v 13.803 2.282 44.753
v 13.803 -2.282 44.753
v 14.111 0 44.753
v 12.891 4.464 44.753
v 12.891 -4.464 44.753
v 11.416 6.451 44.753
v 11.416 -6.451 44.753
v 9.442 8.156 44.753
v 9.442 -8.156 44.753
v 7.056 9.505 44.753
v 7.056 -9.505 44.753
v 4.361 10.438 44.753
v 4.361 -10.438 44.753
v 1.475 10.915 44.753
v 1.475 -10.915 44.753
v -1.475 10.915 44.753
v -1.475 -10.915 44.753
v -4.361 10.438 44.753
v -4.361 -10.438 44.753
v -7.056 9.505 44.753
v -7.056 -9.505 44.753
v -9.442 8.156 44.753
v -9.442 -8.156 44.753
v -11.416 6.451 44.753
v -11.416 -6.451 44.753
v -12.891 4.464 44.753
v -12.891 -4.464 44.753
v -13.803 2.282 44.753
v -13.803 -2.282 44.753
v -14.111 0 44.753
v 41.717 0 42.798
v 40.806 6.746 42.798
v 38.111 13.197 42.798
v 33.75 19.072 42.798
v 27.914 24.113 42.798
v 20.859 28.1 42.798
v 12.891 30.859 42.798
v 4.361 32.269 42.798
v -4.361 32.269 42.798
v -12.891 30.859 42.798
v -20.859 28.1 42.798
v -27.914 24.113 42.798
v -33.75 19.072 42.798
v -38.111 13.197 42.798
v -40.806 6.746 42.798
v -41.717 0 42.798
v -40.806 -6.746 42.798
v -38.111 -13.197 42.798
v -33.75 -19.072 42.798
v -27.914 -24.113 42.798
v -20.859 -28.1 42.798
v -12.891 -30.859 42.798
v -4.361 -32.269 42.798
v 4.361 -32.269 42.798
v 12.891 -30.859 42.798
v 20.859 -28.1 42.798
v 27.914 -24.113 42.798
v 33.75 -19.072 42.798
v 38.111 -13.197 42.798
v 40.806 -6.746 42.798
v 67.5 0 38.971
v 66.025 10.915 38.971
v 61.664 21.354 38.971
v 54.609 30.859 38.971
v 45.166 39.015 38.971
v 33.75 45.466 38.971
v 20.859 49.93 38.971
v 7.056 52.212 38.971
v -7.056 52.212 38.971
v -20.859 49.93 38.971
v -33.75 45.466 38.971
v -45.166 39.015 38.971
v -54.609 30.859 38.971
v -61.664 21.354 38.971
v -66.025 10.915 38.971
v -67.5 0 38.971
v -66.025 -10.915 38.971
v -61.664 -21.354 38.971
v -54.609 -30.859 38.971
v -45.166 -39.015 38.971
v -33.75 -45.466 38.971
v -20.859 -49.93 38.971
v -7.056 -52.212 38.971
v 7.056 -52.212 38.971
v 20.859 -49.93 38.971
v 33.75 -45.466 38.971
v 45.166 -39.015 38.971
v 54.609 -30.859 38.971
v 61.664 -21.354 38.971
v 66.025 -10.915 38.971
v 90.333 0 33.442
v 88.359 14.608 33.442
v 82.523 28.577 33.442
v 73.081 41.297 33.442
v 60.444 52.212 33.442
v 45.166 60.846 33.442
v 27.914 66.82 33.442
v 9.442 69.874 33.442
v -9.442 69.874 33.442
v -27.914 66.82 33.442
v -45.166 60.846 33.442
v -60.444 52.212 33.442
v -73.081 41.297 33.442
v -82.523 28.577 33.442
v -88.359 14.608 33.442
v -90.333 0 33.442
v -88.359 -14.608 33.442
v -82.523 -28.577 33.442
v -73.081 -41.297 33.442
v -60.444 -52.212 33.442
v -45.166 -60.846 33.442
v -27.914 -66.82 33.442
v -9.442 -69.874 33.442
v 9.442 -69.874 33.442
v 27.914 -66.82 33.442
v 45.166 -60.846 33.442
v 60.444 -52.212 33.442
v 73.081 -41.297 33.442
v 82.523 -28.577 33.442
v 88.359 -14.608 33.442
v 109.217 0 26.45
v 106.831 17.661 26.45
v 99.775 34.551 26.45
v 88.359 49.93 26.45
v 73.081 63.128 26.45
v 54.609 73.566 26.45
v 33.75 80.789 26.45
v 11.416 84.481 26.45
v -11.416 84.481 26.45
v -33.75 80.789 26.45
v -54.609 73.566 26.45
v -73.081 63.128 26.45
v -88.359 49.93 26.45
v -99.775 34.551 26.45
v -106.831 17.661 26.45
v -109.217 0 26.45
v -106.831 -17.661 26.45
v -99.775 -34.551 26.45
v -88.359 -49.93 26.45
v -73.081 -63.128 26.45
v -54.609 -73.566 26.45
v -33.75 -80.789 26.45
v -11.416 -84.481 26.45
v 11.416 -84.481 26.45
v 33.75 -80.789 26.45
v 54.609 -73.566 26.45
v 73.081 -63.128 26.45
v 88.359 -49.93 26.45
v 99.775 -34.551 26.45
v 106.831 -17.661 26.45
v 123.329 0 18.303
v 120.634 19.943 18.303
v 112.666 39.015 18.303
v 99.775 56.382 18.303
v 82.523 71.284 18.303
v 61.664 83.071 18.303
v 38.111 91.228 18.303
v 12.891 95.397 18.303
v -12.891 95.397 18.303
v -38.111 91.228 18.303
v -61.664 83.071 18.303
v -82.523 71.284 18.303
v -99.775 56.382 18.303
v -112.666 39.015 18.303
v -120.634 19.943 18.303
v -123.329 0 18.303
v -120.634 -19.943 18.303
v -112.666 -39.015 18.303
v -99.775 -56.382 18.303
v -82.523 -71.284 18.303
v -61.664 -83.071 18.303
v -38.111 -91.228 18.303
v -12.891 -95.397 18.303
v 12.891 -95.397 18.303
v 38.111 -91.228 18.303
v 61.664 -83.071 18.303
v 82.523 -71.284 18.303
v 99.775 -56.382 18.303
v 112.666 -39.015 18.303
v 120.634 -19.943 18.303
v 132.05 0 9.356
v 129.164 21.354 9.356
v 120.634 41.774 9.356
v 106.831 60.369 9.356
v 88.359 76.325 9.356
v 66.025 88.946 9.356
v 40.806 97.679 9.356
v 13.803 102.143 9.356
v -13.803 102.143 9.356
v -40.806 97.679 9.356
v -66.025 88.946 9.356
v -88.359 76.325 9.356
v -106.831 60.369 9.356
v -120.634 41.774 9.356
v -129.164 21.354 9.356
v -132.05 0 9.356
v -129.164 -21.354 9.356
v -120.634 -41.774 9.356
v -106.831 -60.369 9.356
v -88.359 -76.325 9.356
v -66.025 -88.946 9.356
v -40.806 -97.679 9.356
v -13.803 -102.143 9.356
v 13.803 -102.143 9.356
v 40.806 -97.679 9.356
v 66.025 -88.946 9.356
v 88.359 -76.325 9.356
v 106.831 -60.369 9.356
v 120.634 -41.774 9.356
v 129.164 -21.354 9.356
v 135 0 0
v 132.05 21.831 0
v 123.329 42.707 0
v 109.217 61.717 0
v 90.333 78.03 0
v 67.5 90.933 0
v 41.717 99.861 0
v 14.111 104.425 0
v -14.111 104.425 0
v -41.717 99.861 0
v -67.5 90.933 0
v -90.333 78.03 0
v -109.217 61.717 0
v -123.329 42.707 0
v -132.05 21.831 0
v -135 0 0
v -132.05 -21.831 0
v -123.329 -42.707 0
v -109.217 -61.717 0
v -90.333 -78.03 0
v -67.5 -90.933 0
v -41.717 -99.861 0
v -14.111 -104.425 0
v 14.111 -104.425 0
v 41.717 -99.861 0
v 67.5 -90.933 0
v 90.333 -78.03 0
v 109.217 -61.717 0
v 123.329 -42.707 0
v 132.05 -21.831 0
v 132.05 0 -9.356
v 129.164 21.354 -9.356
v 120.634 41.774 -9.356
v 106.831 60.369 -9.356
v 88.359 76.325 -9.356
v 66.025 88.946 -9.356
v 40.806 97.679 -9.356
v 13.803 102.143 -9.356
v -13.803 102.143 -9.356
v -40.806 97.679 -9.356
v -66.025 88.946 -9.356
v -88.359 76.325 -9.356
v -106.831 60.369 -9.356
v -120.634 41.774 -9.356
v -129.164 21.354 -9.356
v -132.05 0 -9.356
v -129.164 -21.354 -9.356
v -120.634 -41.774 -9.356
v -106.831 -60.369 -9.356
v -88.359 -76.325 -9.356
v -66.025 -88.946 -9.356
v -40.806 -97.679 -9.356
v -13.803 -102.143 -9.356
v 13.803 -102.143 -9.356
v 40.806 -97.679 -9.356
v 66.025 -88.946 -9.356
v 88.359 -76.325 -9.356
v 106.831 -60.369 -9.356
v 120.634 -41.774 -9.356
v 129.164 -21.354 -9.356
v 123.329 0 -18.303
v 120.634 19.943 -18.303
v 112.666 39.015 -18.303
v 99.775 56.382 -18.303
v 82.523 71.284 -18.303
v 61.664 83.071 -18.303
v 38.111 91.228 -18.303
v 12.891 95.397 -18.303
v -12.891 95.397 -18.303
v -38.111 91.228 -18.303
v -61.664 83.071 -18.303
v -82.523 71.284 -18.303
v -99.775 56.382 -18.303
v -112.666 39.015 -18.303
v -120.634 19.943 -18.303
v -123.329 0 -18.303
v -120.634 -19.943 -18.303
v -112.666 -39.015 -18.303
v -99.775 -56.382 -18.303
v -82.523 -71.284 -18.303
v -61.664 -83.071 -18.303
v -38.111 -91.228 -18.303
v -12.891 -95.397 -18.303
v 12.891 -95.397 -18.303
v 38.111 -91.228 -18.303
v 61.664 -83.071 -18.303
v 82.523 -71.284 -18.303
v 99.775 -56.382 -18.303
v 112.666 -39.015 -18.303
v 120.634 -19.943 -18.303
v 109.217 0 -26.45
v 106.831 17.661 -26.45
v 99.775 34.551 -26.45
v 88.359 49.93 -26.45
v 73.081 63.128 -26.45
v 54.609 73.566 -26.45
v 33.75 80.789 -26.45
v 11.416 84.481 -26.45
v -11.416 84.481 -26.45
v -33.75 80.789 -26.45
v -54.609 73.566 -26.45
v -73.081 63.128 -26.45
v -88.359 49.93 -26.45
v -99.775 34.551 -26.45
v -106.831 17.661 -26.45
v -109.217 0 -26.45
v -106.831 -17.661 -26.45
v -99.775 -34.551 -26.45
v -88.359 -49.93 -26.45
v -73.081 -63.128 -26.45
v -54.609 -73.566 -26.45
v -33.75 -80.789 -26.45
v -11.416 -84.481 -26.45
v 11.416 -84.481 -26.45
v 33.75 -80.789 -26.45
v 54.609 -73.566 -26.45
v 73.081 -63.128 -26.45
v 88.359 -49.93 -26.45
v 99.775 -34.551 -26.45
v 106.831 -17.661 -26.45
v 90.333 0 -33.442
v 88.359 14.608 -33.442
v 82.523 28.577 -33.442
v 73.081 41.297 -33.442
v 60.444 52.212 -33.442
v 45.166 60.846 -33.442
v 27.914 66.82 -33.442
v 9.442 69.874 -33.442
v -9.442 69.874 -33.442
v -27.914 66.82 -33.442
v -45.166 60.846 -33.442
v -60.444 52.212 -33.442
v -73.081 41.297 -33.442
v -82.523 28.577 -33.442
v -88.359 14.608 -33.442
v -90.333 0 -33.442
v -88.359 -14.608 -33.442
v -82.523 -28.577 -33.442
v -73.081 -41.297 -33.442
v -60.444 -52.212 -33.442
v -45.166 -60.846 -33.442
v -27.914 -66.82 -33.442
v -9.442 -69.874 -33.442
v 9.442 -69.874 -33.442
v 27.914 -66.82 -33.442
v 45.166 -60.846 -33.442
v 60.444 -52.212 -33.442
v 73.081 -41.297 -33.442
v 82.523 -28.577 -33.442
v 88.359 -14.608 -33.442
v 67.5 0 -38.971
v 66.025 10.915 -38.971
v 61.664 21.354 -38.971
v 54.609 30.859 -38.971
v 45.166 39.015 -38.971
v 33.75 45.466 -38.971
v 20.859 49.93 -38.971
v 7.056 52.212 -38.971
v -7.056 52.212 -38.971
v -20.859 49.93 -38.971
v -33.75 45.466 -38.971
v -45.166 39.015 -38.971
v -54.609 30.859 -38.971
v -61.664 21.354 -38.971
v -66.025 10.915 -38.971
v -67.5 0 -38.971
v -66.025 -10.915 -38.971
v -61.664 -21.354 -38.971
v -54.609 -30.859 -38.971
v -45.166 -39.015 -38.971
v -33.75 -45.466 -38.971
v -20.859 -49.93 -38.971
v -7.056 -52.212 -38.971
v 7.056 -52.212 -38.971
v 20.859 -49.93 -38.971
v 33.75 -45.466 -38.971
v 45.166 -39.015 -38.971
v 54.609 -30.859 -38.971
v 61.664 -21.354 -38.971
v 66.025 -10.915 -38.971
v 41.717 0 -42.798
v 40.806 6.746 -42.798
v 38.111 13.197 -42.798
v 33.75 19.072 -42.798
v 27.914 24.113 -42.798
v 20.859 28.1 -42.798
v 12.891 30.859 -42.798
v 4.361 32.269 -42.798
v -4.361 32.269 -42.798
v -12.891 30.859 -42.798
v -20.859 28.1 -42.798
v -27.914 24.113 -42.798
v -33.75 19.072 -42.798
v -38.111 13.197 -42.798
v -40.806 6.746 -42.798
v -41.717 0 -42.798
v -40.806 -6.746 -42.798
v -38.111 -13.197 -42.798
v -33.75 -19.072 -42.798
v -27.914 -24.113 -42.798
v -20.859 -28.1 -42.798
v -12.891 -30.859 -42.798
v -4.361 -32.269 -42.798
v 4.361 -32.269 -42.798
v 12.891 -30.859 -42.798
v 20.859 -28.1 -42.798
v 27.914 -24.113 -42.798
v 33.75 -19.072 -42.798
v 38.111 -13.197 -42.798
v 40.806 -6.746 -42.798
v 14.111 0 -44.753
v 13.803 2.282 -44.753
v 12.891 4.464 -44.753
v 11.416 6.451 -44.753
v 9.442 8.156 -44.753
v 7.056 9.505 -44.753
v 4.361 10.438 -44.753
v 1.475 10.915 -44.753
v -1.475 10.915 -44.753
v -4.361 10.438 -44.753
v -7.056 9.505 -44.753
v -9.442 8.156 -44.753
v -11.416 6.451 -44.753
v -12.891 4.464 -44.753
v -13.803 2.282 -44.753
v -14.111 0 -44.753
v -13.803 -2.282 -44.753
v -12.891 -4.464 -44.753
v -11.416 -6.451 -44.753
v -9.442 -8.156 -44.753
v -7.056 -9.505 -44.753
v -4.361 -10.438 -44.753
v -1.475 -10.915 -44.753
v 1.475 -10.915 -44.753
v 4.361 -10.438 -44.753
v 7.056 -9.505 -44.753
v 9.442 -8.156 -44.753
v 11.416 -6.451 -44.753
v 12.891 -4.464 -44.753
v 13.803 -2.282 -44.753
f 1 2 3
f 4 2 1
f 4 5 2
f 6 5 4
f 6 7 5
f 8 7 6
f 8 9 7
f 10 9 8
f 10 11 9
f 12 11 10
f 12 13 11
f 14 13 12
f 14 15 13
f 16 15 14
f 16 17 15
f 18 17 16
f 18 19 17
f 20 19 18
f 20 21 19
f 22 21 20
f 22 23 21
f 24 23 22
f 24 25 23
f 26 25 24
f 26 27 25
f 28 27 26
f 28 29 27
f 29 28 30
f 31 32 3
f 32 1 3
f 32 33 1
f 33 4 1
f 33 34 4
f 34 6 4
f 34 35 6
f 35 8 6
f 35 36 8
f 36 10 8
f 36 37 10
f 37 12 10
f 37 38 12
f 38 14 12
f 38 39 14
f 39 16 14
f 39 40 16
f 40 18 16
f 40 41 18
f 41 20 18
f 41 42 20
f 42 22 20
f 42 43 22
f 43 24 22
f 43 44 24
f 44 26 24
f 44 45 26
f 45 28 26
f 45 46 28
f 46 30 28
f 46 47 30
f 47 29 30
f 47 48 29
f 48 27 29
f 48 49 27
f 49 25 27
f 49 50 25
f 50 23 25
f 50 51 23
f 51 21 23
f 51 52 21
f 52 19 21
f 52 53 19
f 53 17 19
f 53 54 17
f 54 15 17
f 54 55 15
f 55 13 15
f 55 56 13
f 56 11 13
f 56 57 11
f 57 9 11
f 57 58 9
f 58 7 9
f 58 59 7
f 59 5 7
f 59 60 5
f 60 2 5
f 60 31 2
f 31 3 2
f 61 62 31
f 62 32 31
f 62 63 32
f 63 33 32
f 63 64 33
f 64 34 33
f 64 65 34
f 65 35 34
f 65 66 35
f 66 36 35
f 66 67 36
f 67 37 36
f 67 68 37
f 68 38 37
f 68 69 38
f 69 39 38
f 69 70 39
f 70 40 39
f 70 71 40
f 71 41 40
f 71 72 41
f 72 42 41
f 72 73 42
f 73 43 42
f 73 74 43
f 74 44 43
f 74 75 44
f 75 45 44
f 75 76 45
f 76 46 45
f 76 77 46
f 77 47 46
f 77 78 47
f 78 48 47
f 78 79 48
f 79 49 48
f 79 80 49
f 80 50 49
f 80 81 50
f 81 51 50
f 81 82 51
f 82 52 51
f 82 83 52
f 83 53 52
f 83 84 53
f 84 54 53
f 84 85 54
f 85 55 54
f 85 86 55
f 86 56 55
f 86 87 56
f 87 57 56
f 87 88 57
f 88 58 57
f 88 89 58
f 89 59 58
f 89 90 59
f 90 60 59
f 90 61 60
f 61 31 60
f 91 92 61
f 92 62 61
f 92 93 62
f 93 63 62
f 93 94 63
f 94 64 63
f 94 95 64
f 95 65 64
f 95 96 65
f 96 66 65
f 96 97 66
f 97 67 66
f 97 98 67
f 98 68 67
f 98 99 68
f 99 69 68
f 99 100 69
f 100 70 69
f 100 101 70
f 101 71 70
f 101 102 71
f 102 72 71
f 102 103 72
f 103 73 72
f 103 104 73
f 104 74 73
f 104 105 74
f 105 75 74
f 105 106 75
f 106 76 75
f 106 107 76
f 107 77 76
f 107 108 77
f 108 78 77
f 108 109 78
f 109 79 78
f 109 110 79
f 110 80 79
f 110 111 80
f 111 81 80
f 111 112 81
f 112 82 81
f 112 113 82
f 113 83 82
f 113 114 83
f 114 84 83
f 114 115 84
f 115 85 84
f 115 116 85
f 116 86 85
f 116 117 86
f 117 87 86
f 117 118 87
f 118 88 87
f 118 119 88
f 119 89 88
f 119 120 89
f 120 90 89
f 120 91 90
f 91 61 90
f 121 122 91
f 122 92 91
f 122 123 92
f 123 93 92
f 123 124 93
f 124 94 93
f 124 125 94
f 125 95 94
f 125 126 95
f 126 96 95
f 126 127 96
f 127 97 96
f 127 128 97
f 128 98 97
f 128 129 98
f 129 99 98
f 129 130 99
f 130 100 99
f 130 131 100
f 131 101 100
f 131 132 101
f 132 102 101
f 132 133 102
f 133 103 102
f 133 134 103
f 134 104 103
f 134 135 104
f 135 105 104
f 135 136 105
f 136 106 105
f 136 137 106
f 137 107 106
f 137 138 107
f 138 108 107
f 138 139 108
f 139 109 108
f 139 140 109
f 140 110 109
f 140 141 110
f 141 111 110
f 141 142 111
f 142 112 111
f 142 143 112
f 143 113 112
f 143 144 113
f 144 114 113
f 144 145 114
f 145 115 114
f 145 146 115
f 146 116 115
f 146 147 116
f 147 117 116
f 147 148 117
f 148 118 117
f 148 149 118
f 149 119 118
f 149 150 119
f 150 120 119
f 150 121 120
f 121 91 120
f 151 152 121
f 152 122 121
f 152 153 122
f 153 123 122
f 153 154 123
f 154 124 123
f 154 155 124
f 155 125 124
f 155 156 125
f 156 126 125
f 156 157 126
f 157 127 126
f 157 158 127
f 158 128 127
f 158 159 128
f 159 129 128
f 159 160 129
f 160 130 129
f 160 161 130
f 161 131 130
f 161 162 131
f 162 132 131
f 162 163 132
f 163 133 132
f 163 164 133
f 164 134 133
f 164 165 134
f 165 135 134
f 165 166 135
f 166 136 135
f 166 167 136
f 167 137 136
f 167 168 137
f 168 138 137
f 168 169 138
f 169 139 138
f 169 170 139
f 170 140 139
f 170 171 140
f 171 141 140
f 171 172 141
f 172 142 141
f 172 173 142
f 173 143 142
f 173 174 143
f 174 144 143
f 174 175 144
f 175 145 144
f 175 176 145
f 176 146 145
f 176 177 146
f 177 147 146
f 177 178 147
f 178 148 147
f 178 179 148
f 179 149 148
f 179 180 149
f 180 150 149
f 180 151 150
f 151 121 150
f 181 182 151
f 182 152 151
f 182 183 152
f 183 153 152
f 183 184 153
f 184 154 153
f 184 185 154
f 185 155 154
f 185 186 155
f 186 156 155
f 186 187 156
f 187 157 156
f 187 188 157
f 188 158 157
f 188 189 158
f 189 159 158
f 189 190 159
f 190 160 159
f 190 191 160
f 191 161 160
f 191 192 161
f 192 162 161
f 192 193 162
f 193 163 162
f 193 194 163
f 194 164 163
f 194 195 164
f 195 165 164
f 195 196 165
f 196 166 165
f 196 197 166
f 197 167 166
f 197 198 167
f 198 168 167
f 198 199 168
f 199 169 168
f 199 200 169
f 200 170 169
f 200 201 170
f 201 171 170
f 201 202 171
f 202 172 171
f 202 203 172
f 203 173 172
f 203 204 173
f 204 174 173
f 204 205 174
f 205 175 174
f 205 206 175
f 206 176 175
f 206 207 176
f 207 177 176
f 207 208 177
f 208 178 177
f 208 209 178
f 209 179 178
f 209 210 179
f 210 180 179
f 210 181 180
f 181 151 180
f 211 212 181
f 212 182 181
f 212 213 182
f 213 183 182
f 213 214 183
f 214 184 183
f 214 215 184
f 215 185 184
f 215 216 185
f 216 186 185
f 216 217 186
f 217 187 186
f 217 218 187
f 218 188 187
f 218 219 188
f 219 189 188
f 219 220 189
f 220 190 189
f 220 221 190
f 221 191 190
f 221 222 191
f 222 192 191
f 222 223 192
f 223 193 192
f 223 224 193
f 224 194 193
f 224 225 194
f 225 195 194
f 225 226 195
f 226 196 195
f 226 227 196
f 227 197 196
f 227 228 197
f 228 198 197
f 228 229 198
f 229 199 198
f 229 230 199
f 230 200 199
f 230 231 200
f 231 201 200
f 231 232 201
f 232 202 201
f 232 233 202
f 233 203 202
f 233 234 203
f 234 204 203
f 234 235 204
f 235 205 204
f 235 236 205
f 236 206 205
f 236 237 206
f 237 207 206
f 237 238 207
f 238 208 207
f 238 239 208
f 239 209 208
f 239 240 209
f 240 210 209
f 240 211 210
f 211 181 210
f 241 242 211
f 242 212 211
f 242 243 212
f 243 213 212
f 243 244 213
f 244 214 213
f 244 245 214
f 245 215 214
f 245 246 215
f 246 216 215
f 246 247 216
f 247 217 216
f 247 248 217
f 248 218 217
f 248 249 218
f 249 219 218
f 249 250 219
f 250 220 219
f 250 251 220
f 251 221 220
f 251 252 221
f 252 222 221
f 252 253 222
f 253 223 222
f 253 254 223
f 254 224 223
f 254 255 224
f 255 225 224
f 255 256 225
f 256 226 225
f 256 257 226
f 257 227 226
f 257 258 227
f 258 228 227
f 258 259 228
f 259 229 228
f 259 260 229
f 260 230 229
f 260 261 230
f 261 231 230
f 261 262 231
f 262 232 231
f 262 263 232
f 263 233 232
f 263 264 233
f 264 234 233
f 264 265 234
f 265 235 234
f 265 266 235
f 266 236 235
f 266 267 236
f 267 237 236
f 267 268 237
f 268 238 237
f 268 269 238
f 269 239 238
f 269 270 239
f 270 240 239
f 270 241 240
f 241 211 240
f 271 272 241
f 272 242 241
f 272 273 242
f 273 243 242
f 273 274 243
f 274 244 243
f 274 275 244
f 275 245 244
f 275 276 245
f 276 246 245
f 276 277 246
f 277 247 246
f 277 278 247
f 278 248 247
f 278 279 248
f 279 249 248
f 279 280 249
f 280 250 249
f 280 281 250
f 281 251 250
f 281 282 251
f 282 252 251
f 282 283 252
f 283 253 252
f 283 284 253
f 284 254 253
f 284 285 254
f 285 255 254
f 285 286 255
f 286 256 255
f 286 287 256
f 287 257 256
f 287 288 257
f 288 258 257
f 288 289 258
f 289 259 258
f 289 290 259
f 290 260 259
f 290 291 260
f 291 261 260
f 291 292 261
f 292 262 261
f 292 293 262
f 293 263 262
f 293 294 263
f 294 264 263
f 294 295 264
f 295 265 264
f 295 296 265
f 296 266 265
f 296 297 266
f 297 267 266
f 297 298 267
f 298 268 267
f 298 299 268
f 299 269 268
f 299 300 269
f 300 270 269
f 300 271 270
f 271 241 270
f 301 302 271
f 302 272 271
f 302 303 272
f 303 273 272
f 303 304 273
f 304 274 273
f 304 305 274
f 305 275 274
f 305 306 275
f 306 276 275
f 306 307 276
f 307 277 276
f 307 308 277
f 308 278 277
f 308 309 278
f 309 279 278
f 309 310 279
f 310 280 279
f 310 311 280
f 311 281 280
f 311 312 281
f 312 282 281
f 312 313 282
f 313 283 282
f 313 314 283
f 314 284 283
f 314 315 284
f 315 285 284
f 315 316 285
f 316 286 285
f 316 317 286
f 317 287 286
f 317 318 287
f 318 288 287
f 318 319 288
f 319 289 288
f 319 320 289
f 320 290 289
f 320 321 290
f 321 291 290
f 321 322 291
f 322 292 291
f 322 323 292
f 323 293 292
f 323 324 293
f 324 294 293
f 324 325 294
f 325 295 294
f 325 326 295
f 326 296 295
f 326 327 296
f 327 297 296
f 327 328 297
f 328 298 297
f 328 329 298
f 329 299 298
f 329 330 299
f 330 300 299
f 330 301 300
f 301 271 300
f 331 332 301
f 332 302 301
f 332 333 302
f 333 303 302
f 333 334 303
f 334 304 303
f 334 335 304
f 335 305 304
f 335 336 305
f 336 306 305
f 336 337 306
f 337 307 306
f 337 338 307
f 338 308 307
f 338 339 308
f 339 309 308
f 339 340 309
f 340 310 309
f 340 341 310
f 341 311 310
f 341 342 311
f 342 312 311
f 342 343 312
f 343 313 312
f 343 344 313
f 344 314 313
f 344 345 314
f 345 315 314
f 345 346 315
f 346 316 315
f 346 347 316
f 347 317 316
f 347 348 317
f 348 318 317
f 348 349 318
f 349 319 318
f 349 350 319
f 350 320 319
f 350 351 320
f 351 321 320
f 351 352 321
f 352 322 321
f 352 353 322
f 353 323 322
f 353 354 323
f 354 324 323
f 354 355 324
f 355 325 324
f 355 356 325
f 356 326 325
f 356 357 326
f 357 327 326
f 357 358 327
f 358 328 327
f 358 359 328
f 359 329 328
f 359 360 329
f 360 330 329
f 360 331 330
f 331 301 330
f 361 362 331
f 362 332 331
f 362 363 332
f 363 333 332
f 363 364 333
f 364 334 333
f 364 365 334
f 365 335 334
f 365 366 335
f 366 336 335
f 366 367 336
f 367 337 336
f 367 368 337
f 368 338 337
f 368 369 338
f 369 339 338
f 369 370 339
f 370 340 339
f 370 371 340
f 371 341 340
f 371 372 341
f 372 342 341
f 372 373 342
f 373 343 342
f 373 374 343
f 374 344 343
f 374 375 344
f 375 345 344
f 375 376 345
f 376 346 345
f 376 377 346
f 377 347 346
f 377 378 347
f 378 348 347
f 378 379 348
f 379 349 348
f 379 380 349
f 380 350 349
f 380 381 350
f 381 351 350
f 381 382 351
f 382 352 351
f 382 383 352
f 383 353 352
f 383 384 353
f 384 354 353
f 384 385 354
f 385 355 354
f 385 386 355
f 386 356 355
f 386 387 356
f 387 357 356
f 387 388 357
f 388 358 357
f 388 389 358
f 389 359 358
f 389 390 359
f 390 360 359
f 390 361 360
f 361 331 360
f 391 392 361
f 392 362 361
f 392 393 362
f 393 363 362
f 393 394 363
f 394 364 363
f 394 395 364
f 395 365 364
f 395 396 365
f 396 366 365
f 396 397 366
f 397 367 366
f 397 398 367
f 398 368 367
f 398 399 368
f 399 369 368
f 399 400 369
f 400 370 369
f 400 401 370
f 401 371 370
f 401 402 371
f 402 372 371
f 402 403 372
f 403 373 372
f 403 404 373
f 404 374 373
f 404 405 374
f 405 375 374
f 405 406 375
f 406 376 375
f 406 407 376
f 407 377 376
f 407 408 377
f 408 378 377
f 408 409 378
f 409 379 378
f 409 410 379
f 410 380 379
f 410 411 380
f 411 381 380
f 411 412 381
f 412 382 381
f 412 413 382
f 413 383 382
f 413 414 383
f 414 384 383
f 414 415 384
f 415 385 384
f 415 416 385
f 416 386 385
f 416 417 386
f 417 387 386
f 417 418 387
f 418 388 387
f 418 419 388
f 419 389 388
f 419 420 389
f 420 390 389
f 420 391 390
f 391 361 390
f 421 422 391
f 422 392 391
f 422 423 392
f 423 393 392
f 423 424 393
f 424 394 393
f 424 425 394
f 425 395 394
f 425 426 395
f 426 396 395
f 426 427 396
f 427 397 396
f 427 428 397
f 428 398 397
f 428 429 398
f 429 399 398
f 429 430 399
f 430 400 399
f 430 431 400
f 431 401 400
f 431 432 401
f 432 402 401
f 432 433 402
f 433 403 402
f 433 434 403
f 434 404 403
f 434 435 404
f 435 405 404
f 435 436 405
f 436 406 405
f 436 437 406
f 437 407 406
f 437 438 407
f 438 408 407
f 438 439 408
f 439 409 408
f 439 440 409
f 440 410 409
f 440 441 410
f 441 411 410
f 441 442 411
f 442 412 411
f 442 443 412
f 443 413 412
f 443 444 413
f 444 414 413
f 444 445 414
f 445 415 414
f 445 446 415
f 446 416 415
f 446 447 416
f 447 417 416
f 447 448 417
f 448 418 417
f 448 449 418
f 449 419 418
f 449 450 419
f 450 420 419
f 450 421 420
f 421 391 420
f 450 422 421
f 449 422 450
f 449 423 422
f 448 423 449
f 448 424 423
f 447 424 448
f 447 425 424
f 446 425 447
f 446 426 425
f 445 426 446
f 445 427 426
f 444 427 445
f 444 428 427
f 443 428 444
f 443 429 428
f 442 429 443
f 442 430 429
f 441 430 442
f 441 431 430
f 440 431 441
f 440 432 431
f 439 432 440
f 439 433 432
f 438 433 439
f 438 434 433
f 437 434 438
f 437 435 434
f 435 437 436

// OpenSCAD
// Generated by SolidPython 1.0.1 on 2020-07-29 00:46:48


scale(v = [9, 7, 3]) {
	sphere(r = 15);
}
/***********************************************
*********      SolidPython code:      **********
************************************************
 
# import packages: SolidPython
from solid import *
from solid.utils import *
from itertools import chain, combinations, permutations


class Resize:

    def __init__(self, scad_file):
        self.scad_file = scad_file
        #self.scad_file = import_scad(scad_file)
        # cone/cylinder param:
        self.r1 = 0
        self.r2 = 0
        self.h = 0
        # rectangular prism param:
        self.w = 0
        self.l = 0
        # ellipse param:
        self.r = 0

    # import OpenScad code (file name corresponds to shape)


    # classify shape + parameters
    def assign(self, param1, param2, param3):
        if self.scad_file == 'cone.scad':
            self.r1 = param1
            self.r2 = param2
            self.h = param3
        elif self.scad_file == 'cylinder.scad':
            self.r1 = param1
            self.r2 = param2
            self.h = param3
        elif self.scad_file == 'rectangularPrism.scad':
            self.h = param1
            self.l = param2
            self.w = param3
        else:
            self.r = param1
            self.h = param2

    # resize parameters
    def iterate(self):
        x = range(3, 20, 2)
        i = 1
        if self.scad_file == 'cone.scad':
            tempList = list(permutations(x, 2))
            for temp in tempList:
                param1 = temp[0]
                param2 = temp[1]
                filepath = 'produced_scad_files/' + 'cone' + str(param1) + '_' + str(param2) + '_' + '.scad'
                scad_render_to_file(cylinder(h=param1, r1=param2, r2=0), filepath)

        elif self.scad_file == 'cylinder.scad':
            tempList = list(permutations(x, 3))
            for temp in tempList:
                param1 = temp[0]
                param2 = temp[1]
                filepath = 'produced_scad_files/' + 'cylinder' + str(param1) + '_' + str(param2) + '_' + '.scad'
                scad_render_to_file(cylinder(h=param1, r1=param2, r2=param2), filepath)

        elif self.scad_file == 'rectangularPrism.scad':
            tempList = list(permutations(x, 3))
            for temp in tempList:
                param1 = temp[0]
                param2 = temp[1]
                param3 = temp[2]
                filepath = 'produced_scad_files/' + 'rectangularPrism' + str(param1) + '_' + str(param2) + '_' + str(
                    param3) + '.scad'
                scad_render_to_file(cube(size=(param1, param2, param3)), filepath)

        elif self.scad_file == 'ellipse.scad':
            tempList = list(permutations(x, 4))
            for temp in tempList:
                param1 = temp[0]
                param2 = temp[1]
                param3 = temp[2]
                param4 = temp[3]
                filepath = 'produced_scad_files/' + 'ellipse' + str(param1) + '_' + str(param2) + '_' + str(param3) + '_' + str(param4) + '.scad'
                scad_render_to_file(scale([param1, param2, param3])(sphere(r=param4)), filepath)

    def render_to_scadfile(self):
        scad_render_to_file(scad, 'example.scad') 
 
************************************************/
